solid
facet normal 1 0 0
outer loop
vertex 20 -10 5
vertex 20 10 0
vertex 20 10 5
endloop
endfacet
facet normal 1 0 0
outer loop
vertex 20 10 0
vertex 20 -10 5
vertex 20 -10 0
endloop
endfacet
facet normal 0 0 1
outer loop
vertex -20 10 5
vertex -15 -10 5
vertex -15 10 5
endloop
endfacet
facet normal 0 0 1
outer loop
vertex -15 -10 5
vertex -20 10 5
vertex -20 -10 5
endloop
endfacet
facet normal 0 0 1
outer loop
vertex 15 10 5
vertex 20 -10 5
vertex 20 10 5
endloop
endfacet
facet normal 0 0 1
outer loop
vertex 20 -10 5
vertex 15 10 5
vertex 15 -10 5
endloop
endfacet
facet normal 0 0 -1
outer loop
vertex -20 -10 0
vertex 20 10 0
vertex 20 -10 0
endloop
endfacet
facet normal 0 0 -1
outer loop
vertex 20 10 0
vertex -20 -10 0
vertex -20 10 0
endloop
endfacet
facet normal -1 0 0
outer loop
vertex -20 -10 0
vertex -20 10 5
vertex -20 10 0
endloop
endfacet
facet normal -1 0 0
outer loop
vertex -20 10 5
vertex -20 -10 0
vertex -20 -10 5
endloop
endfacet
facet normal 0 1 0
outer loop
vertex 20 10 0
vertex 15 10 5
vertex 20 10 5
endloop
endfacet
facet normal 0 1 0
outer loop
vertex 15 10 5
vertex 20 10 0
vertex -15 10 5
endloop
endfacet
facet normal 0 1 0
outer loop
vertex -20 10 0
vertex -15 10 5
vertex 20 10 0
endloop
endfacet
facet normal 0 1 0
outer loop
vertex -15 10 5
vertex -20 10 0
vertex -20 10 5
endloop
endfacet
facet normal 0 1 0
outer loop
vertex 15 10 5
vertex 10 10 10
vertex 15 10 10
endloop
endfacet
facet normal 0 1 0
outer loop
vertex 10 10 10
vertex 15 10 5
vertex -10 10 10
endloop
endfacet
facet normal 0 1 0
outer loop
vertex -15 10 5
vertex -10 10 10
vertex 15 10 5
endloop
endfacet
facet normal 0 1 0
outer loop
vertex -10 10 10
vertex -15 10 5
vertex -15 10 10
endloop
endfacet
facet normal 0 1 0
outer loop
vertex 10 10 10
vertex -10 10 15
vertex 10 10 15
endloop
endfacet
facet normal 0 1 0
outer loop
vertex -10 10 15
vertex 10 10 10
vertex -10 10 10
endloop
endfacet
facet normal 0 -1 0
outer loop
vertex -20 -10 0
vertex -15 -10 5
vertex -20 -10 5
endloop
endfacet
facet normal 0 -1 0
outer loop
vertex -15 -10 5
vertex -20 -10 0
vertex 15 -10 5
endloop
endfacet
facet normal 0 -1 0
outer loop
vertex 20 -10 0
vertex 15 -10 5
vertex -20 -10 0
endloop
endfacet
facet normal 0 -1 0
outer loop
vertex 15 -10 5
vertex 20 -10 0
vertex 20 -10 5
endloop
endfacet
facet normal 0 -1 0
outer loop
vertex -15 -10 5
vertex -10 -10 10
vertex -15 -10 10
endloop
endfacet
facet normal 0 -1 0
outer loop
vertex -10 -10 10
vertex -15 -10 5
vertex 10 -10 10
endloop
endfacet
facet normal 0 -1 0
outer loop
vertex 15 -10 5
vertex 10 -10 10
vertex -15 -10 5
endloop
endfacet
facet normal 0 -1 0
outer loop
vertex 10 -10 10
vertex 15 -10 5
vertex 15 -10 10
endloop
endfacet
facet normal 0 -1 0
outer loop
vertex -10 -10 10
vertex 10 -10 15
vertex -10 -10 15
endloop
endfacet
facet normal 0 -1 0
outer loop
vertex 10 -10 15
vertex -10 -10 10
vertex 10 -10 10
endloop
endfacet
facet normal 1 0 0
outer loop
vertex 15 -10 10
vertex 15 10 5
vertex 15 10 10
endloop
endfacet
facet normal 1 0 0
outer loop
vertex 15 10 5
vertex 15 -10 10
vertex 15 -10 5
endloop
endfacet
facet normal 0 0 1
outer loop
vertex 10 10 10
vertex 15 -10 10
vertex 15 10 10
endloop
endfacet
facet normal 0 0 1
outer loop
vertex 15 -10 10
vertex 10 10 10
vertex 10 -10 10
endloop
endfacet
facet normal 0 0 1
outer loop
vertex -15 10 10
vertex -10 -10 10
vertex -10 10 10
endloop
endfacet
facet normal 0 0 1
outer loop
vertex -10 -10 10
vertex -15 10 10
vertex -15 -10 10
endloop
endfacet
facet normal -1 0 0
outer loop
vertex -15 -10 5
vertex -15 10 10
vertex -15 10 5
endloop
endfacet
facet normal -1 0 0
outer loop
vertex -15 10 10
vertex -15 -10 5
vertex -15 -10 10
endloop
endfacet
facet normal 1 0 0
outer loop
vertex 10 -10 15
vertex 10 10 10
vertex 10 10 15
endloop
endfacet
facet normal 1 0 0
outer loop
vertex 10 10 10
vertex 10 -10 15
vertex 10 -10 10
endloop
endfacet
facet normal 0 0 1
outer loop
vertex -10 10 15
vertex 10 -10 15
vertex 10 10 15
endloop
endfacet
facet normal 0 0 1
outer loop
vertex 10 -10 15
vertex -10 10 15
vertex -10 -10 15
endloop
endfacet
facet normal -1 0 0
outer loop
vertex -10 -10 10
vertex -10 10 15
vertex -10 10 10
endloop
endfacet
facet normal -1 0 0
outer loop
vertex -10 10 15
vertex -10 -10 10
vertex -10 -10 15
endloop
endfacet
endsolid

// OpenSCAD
$fn = 48;

label_height = 0;
groove_depth = 0;

module step_block() {
  difference() {
    union() {
      translate([0, 0, 2.5])
        cube([40, 20, 5], center = true);
      translate([0, 0, 7.5])
        cube([30, 20, 5], center = true);
      translate([0, 0, 12.5])
        cube([20, 20, 5], center = true);
    }

    if (groove_depth > 0) {
      for (z = [2.5, 7.5, 12.5]) {
        translate([0, -10 + groove_depth / 2, z])
          cube([14, groove_depth, 1], center = true);
      }
    }
  }
}

step_block();

if (label_height > 0) {
  translate([17.5, 0, 5])
    linear_extrude(height = label_height)
      text("5", size = 3.2, halign = "center", valign = "center");
  translate([12.5, 0, 10])
    linear_extrude(height = label_height)
      text("10", size = 2.6, halign = "center", valign = "center");
  translate([0, 0, 15])
    linear_extrude(height = label_height)
      text("15", size = 4, halign = "center", valign = "center");
}
